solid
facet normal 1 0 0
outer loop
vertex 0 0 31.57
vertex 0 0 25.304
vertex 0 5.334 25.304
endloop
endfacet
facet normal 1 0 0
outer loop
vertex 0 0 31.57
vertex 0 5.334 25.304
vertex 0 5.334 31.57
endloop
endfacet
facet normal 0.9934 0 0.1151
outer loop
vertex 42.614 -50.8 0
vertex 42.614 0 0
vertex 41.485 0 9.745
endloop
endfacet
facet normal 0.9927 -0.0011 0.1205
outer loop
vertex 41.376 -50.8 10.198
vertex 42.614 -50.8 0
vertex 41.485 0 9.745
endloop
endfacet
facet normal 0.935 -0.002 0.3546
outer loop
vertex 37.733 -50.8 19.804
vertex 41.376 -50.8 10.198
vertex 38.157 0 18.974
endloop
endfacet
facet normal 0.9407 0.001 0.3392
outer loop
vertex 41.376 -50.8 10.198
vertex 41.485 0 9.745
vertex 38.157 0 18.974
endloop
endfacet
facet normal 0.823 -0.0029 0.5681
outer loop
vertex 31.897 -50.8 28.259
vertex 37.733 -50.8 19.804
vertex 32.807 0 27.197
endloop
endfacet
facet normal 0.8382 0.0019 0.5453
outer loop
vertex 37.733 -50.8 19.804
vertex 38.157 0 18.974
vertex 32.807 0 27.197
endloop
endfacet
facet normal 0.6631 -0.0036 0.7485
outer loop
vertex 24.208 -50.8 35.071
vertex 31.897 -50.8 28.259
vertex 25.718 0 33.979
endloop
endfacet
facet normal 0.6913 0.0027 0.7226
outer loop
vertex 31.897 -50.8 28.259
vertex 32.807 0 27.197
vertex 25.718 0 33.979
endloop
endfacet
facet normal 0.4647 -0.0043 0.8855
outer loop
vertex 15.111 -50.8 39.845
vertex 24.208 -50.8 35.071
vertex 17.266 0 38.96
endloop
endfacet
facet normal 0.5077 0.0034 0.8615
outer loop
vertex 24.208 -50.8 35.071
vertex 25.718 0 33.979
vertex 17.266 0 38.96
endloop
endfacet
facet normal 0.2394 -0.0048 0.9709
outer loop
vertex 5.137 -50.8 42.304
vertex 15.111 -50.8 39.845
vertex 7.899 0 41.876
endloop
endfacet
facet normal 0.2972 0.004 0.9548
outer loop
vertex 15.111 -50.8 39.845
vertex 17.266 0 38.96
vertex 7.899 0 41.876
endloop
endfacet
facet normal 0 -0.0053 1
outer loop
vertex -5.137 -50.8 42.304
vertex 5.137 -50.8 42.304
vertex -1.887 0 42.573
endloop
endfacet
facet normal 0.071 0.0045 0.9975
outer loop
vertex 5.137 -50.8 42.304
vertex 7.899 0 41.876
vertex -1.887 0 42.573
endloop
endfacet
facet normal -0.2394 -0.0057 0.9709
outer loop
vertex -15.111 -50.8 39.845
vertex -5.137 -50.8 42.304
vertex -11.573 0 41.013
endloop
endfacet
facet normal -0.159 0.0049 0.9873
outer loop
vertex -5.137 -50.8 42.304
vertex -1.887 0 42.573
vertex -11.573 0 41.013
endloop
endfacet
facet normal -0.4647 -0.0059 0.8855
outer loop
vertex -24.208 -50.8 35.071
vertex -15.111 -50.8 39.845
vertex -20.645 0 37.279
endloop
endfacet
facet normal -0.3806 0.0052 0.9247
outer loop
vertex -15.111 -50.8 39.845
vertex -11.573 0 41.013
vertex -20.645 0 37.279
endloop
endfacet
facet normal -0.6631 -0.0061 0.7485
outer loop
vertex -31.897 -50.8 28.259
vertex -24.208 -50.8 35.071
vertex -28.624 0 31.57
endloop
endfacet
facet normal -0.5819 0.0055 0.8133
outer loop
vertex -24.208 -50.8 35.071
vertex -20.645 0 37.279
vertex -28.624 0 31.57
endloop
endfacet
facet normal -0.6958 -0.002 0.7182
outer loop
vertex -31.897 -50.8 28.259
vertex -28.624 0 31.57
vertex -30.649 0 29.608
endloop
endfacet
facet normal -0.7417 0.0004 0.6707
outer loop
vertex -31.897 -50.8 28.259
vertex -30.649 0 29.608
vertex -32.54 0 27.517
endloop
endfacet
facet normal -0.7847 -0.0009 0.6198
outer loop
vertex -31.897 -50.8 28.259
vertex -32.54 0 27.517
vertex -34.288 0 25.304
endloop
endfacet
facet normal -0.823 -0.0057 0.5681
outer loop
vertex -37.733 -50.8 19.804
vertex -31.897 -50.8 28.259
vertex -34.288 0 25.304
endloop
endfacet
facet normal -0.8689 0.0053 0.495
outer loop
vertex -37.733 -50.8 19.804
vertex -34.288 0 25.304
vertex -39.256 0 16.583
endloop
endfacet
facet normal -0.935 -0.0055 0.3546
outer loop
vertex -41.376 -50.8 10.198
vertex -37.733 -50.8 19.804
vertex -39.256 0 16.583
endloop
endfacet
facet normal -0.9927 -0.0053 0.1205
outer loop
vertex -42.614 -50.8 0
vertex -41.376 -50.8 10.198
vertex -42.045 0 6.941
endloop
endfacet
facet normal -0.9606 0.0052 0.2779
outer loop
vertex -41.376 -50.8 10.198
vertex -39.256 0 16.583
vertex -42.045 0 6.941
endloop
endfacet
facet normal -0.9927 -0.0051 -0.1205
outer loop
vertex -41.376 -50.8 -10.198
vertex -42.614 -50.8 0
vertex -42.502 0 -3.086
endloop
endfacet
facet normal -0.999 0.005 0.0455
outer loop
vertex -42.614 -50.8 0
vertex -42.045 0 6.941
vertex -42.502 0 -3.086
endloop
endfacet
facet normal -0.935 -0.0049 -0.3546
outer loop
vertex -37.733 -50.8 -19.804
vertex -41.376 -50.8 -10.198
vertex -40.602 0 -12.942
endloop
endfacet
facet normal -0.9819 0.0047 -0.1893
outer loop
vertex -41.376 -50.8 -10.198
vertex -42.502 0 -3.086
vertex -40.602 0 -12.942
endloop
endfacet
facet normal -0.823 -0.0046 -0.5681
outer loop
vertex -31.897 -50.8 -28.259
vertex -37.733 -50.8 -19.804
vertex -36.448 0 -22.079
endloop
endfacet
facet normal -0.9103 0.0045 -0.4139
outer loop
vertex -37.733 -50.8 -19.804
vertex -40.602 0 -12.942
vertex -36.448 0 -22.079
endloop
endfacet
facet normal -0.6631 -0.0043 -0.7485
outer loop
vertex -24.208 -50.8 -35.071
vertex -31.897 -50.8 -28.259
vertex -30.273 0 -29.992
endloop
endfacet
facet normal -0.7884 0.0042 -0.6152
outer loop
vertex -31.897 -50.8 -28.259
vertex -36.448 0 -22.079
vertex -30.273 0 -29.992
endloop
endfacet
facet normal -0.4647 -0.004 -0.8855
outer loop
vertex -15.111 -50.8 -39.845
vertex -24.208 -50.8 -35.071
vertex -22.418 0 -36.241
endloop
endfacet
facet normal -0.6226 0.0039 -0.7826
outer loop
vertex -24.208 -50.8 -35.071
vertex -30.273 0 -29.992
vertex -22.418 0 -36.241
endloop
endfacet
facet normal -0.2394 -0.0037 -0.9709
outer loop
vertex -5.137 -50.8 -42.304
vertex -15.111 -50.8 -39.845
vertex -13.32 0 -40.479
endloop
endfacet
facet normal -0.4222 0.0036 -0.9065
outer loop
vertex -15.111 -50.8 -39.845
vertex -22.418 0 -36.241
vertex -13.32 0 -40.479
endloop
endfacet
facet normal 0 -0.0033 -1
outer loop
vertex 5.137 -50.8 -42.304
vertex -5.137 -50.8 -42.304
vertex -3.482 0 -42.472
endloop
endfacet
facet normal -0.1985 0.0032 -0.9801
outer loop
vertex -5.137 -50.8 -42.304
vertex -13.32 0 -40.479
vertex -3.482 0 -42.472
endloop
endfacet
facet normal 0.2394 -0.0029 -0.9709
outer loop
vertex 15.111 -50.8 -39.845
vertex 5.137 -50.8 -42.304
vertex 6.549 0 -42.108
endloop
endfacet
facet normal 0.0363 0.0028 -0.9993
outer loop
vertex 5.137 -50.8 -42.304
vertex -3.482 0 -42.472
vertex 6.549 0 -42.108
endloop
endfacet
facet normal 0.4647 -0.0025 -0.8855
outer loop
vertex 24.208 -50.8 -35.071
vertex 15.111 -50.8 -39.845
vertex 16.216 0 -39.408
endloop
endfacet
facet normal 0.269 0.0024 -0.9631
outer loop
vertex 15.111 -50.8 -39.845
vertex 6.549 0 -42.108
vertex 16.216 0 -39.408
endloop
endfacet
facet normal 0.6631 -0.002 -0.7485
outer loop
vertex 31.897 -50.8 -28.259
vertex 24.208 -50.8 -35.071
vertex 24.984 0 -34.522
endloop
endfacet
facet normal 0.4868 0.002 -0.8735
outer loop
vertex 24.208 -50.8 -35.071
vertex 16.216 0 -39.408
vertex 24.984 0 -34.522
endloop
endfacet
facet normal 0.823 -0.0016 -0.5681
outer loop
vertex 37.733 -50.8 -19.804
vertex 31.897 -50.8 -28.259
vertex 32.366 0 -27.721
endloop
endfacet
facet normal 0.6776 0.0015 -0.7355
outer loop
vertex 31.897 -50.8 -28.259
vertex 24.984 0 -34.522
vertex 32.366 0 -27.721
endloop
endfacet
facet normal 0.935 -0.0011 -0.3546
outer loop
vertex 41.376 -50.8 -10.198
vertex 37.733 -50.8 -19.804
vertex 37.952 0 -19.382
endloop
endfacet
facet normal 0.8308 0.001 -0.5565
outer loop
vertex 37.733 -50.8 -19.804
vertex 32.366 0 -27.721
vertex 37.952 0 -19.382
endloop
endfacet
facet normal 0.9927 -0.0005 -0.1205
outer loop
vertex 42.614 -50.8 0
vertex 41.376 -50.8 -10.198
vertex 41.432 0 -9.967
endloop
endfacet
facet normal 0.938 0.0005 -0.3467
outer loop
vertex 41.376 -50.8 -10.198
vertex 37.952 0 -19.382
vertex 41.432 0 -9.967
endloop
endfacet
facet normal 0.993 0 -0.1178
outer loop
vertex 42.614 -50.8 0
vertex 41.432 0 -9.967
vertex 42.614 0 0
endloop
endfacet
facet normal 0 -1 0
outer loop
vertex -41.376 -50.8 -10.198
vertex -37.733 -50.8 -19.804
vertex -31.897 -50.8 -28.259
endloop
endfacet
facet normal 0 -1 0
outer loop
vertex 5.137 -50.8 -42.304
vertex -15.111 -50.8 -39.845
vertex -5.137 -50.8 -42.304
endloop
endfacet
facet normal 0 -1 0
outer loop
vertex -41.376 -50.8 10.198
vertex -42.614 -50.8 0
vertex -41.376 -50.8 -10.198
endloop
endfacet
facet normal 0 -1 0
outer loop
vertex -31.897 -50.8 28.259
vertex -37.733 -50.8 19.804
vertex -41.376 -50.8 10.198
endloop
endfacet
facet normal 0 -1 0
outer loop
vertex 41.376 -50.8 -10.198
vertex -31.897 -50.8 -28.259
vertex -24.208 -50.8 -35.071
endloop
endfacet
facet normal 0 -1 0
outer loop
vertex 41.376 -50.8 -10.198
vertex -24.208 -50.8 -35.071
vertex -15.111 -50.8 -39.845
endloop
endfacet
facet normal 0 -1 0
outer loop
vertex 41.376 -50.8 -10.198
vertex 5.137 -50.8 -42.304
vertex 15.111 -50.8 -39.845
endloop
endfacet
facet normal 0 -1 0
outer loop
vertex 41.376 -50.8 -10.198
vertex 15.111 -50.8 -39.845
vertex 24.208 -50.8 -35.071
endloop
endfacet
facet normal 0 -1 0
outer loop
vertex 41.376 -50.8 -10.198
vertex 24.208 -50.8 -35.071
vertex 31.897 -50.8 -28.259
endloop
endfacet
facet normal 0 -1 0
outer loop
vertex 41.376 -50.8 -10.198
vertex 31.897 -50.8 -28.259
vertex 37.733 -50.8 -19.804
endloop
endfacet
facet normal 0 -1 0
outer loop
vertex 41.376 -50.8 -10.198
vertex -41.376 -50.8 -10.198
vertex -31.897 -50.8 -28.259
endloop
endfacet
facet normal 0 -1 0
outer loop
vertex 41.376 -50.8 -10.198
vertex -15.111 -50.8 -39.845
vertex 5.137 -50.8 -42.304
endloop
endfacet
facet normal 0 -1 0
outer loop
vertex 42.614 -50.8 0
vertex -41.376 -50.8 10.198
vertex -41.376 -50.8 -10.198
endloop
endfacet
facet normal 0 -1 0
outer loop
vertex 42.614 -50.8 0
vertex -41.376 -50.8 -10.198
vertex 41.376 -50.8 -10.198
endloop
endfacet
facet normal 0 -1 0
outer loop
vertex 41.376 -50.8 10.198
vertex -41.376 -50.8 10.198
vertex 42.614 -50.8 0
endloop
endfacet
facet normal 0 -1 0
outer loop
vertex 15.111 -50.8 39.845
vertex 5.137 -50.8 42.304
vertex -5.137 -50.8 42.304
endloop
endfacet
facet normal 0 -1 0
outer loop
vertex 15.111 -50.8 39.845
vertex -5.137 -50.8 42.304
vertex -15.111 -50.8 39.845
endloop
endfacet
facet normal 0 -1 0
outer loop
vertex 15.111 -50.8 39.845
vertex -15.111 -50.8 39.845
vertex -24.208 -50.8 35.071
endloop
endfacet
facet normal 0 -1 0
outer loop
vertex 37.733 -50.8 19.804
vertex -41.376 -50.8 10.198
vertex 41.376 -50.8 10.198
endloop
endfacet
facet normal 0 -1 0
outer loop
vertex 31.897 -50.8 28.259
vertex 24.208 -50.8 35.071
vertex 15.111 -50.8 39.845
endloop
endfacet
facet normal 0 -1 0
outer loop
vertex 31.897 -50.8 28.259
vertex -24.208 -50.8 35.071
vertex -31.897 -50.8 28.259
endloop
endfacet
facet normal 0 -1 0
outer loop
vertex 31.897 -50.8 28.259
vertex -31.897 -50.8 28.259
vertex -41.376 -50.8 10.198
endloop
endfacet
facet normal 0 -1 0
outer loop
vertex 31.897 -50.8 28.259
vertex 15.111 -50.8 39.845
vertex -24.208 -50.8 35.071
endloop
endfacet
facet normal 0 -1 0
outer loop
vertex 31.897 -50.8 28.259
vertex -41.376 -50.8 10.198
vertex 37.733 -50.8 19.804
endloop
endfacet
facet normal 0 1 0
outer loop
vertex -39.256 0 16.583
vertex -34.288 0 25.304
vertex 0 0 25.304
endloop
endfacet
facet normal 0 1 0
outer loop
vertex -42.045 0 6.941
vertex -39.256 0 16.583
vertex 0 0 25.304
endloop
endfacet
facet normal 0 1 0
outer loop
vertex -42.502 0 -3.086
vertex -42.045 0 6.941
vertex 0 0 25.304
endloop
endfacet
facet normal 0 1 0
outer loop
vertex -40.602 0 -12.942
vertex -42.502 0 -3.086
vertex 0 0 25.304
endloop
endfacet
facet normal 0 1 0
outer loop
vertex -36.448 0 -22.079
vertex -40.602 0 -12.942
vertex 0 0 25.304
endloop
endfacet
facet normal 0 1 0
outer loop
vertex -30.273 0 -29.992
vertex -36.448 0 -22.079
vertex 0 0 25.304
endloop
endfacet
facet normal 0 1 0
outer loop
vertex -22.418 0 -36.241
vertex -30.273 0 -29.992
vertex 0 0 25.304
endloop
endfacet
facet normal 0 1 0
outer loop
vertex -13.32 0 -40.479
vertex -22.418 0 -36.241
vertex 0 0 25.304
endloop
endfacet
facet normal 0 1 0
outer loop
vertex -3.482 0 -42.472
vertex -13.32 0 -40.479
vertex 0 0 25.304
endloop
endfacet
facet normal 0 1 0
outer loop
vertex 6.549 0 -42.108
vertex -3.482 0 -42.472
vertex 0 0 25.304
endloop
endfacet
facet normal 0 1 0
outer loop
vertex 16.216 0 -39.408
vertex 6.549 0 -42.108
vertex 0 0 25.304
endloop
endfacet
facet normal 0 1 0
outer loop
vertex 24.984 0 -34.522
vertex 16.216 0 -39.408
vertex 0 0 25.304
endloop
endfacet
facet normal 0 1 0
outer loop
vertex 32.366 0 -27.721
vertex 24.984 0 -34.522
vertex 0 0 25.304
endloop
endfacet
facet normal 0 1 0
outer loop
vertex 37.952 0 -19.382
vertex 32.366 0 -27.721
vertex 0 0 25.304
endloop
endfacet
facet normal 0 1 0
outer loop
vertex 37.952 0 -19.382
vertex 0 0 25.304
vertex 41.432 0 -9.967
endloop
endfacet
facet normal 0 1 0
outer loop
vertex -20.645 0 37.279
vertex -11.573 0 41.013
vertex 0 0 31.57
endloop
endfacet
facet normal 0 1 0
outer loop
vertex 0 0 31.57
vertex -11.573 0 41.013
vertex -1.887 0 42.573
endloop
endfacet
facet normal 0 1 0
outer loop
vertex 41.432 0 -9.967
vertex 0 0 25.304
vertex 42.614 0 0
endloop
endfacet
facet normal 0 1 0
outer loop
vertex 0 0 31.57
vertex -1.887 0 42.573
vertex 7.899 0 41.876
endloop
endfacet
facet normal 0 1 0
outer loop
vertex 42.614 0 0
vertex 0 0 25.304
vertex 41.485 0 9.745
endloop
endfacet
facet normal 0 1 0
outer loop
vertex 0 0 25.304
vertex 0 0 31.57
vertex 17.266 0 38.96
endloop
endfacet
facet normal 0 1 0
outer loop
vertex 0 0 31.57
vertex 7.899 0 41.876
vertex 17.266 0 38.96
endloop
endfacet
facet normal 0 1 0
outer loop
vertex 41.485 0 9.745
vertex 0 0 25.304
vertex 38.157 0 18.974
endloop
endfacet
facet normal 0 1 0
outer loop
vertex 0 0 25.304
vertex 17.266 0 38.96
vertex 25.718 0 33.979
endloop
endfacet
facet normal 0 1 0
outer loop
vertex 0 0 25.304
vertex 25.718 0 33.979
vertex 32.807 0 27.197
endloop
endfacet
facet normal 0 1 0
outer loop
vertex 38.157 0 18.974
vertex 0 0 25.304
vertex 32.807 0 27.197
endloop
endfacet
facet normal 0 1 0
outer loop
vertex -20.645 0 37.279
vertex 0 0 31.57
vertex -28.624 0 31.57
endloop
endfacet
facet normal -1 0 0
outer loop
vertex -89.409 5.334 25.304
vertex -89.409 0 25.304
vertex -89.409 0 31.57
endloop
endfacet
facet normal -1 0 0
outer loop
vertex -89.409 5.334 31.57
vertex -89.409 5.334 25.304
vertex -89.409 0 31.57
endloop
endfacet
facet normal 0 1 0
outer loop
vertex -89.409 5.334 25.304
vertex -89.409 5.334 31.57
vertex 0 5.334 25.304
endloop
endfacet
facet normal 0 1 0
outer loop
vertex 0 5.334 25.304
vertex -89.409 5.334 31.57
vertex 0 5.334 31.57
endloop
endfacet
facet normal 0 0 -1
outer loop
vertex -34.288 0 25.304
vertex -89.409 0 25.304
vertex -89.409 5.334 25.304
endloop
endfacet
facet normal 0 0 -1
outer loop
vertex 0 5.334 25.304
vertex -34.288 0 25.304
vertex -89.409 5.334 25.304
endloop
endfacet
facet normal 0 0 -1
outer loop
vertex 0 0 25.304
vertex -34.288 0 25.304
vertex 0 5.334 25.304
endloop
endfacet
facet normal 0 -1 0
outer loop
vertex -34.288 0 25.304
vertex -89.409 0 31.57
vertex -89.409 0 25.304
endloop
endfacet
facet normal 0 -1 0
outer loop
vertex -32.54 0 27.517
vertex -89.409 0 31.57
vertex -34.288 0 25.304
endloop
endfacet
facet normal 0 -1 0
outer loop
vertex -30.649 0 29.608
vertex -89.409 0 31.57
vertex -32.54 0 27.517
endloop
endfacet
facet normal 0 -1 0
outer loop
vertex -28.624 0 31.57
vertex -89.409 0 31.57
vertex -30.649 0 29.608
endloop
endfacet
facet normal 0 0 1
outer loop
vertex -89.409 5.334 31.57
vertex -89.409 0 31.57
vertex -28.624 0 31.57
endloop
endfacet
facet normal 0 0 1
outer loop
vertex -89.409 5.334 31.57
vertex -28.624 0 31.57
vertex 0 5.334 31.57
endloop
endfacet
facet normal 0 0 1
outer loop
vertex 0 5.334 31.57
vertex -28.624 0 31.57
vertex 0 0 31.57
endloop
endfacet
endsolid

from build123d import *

# Parameters (mm, degrees)
F0_R     = 42.6143864145
F0_R_2   = 6.7521330408
F1_DEPTH = 25.4
F2_DEPTH = 25.4
F3_W     = 89.4087702036
F3_H     = 6.2658451498
F4_DEPTH = 5.334


with BuildPart() as f1:
    # F0 (on Front) → F1 (new body)
    with BuildSketch(Plane.XZ):
        Circle(F0_R)
        Circle(F0_R_2, mode=Mode.SUBTRACT)
        Circle(F0_R_2)
    extrude(amount=F1_DEPTH)

    # F2 (add): a face of the model
    f2_faces = [f1.faces().sort_by_distance(p)[0] for p in [
        (0, -25.4, 0),
    ]]
    extrude(f2_faces, amount=F2_DEPTH)

    # F3 (on Front) → F4 (join)
    with BuildSketch(Plane.XZ):
        with Locations((-44.7043851018, 28.437288478)):
            Rectangle(F3_W, F3_H)
    extrude(amount=-F4_DEPTH)


solid = f1.part
